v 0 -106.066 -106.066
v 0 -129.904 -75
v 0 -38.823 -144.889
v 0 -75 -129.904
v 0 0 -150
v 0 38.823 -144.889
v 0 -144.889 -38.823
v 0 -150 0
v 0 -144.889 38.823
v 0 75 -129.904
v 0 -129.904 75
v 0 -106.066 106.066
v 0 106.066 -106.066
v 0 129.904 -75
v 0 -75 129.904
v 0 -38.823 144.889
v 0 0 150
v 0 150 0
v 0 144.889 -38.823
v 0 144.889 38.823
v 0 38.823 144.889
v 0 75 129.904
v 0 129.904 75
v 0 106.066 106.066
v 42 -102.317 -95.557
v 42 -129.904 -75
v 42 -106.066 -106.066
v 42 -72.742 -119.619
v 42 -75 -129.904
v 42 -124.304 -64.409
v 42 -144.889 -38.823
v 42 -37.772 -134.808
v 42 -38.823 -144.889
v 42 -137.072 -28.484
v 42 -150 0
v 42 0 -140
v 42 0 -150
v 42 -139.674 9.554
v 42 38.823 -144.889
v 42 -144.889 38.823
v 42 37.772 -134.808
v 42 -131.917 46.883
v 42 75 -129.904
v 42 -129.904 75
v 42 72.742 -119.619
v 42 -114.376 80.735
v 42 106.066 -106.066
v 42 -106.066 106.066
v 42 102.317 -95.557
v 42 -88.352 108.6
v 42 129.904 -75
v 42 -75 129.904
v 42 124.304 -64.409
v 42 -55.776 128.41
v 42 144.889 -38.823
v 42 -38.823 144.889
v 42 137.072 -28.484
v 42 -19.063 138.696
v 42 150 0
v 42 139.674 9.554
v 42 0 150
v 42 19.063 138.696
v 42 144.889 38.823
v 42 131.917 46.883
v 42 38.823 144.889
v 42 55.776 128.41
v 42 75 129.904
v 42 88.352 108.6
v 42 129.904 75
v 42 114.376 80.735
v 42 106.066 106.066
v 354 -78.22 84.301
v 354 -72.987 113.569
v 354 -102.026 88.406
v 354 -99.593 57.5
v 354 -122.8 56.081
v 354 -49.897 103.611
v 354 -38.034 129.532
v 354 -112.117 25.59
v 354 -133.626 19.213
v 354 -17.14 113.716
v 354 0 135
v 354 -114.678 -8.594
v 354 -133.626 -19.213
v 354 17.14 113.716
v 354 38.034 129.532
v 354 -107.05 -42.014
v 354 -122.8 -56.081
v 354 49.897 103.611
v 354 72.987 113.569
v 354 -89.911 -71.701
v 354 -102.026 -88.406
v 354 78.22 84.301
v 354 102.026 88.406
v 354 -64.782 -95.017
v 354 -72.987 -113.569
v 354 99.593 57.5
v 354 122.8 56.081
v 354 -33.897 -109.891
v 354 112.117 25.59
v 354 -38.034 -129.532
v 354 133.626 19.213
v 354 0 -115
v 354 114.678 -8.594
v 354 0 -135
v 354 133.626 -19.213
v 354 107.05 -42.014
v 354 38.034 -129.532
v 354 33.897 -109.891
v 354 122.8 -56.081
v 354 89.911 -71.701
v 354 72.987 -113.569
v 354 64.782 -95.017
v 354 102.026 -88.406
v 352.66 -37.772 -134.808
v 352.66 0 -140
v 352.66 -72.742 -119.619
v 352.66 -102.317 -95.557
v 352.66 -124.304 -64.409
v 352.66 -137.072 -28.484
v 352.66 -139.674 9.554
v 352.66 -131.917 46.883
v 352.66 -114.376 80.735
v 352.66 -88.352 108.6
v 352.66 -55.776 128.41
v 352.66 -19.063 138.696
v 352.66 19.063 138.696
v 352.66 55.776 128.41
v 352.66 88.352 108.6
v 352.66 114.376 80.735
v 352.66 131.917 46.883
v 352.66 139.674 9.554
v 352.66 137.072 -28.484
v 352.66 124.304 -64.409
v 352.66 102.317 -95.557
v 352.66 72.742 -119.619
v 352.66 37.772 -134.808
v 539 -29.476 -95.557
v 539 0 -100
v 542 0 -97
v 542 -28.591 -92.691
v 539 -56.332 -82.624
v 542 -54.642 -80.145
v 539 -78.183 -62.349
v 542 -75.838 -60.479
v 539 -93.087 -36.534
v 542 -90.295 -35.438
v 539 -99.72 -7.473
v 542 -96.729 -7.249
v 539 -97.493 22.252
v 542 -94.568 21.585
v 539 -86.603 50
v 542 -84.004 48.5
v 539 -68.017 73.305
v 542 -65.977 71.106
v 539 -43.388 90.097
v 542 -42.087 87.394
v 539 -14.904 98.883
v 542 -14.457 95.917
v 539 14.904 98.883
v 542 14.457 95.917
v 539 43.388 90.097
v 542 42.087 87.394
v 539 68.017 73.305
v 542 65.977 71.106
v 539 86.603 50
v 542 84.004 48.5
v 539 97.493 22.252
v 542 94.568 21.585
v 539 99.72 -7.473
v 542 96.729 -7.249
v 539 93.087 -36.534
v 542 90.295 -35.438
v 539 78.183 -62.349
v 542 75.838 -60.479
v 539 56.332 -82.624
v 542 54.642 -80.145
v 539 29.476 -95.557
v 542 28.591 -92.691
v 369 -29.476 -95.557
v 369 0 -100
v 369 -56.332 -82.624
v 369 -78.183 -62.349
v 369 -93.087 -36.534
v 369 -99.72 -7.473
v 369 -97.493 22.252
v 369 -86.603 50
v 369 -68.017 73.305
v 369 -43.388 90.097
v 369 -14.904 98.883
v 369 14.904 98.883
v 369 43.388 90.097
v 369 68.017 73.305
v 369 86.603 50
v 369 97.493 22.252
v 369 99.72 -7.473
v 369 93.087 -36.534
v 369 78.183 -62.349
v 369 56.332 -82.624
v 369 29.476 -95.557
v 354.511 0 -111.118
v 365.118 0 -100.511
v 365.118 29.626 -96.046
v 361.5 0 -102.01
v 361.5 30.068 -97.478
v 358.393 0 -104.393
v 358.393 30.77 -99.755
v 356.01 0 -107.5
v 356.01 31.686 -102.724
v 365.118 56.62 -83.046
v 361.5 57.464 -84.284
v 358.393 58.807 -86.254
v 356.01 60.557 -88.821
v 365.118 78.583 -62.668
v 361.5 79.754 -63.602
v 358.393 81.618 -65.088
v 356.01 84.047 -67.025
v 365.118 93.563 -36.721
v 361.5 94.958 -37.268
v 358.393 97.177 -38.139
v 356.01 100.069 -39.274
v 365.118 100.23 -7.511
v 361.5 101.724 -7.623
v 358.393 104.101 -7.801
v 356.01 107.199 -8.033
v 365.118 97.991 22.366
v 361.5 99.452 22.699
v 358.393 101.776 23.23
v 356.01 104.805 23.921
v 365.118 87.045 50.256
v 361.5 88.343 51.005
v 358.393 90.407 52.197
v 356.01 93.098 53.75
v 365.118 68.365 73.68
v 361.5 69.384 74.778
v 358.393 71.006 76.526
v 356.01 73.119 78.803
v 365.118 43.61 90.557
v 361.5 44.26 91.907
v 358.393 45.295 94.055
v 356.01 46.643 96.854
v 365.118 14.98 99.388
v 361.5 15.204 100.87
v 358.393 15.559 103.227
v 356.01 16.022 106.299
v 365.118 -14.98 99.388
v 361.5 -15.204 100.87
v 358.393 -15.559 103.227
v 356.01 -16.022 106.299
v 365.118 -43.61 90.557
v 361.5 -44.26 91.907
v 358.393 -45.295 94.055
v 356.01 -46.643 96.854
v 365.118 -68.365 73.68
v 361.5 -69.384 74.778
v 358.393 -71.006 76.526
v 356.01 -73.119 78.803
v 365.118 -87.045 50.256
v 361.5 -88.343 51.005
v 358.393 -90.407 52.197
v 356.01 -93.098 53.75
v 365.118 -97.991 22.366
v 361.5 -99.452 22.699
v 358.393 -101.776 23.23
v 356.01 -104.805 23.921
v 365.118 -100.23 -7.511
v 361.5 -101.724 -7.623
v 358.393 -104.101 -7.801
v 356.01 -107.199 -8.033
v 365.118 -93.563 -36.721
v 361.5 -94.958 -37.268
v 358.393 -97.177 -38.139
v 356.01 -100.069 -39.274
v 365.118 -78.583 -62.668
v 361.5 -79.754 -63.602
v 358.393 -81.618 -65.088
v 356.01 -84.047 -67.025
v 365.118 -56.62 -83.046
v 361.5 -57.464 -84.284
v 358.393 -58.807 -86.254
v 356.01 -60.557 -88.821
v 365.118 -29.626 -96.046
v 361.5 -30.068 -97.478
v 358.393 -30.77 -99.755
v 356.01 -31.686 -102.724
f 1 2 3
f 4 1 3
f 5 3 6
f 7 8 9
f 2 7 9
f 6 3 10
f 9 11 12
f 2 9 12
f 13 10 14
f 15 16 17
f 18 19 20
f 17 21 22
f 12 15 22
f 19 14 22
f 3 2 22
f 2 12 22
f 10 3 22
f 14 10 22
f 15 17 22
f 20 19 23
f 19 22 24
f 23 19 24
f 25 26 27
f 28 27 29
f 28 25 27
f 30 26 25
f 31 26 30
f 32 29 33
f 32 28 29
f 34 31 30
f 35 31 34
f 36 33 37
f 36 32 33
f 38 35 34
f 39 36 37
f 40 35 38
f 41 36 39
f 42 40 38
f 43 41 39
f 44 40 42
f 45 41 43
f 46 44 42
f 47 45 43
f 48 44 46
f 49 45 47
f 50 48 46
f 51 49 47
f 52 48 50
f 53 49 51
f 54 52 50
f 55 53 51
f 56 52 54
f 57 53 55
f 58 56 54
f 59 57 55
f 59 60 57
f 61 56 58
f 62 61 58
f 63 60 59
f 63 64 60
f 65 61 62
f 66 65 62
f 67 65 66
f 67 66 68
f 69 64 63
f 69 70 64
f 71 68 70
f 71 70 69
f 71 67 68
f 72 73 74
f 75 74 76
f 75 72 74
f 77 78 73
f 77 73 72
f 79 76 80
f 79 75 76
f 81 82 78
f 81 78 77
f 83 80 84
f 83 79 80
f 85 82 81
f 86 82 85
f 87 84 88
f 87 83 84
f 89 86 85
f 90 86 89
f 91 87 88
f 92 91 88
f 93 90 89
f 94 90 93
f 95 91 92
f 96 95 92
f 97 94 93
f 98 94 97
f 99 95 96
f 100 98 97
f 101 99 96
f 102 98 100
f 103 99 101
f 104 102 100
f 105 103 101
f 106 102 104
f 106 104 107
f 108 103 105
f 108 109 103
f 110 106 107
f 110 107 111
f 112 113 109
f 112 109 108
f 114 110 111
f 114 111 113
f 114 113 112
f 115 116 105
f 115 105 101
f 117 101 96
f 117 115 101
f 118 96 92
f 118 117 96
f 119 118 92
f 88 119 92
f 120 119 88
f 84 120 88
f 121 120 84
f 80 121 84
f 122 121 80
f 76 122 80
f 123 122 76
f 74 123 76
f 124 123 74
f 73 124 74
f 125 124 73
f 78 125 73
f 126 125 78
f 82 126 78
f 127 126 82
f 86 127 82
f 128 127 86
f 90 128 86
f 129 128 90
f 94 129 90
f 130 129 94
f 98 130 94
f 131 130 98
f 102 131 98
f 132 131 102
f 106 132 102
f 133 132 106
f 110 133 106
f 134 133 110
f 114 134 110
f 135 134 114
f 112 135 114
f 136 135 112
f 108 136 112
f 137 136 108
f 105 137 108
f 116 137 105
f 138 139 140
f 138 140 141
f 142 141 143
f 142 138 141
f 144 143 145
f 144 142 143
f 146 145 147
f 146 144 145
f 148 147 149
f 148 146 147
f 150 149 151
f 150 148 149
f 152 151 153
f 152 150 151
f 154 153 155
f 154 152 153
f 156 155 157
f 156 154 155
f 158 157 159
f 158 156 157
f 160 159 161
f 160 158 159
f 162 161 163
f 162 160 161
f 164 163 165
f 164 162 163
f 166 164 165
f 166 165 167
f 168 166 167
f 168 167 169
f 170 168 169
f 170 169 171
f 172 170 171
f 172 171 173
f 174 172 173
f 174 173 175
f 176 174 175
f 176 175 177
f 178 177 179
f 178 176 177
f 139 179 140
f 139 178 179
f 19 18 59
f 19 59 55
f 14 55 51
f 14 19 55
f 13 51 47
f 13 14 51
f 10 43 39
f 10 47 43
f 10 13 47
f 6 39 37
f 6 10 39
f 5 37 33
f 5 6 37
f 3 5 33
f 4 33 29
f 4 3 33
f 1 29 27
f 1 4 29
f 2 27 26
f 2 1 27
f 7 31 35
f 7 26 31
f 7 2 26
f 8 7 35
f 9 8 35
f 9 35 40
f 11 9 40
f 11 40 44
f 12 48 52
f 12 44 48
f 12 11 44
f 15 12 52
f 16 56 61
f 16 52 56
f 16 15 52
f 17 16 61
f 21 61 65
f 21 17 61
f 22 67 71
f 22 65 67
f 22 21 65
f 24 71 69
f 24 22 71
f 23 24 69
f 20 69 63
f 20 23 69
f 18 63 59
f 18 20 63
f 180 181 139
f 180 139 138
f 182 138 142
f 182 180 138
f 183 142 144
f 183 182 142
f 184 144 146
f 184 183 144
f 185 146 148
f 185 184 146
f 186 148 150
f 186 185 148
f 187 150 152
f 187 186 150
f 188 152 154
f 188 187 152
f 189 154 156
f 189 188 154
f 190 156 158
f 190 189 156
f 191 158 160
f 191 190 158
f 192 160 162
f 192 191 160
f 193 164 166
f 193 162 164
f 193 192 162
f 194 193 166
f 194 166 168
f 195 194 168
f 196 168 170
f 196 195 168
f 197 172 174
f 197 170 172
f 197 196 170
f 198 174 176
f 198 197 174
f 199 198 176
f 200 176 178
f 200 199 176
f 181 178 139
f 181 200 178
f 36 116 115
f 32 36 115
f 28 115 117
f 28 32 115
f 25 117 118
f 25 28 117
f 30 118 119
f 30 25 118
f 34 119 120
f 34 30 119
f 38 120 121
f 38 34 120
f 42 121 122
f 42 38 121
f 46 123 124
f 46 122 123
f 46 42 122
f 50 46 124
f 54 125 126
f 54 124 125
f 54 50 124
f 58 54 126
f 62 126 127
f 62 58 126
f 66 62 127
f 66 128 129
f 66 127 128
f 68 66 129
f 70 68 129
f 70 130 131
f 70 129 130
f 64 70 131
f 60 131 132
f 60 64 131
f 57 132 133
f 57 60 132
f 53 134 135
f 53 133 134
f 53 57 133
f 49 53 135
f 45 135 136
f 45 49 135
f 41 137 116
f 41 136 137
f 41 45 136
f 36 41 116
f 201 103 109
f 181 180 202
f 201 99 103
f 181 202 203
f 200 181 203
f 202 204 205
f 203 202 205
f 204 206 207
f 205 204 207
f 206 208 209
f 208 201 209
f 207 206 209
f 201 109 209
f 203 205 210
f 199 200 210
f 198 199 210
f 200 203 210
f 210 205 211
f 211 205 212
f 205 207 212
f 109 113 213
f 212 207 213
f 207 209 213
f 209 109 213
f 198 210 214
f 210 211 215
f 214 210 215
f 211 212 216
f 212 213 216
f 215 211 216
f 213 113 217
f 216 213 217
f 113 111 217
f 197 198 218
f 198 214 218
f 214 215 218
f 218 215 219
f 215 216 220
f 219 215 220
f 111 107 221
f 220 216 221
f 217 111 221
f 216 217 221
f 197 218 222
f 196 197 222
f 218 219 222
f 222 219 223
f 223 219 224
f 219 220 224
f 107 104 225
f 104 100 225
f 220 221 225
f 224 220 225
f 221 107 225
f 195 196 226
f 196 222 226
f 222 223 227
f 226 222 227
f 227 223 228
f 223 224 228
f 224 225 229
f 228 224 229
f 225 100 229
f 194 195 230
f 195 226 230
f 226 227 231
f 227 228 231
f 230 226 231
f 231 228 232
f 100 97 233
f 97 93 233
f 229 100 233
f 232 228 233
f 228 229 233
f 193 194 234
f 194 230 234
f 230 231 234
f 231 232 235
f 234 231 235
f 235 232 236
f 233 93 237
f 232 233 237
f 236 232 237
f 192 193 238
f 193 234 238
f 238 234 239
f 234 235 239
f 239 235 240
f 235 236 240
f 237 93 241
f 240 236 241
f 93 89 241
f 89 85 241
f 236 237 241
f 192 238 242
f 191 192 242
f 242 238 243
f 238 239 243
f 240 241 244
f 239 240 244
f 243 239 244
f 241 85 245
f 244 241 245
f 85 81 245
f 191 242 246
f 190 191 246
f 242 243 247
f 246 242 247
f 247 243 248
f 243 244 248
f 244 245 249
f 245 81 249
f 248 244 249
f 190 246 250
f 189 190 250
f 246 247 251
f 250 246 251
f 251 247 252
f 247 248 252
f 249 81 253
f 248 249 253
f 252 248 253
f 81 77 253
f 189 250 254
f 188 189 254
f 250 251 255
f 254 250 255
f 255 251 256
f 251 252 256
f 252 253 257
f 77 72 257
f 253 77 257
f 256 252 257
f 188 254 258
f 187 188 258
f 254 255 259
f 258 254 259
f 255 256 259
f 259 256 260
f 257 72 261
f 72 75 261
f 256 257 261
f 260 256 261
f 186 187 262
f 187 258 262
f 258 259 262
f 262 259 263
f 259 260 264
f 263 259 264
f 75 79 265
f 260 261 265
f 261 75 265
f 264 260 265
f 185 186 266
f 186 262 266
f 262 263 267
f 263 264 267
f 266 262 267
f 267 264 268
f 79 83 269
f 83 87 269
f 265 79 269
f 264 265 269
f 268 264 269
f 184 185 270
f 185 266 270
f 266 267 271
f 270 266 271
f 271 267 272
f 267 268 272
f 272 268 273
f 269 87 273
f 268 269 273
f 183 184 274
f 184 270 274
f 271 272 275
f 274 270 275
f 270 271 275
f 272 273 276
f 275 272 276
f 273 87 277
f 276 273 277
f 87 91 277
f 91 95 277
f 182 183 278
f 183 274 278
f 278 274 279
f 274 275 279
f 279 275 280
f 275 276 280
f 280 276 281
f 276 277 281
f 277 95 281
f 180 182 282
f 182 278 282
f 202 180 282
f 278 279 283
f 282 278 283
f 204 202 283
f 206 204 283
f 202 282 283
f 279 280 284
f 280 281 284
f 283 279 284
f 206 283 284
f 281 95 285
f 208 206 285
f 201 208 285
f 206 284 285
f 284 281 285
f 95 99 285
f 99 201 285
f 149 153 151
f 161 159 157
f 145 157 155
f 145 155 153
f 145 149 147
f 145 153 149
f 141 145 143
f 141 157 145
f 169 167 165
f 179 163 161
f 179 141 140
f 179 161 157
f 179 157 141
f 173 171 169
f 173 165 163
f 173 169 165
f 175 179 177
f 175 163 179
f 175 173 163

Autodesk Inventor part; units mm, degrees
ref_plane "YZ Plane" through (0, 0, 0) normal (1, 0, 0) x (0, 1, 0)
ref_plane "XZ Plane" through (0, 0, 0) normal (0, 1, 0) x (-1, 0, 0)
ref_plane "XY Plane" through (0, 0, 0) normal (0, 0, 1) x (1, 0, 0)
sketch "Sketch1" plane through (0, 0, 0) normal (1, 0, 0) x (0, 1, 0)
  circle A0 centre (0, 0) radius 150
  dimension "d0" = 300
extrude "Extrusion1" add sketch "Sketch1" along normal blind 42
sketch "Sketch2" plane through (42, 0, 0) normal (1, 0, 0) x (0, 0, -1)
  circle A0 centre (0, 0) radius 140
  dimension "d3" = 280
extrude "Extrusion2" add sketch "Sketch2" along normal blind 312
sketch "Sketch3" plane through (354, 0, 0) normal (1, 0, 0) x (0, 0, -1)
  circle A0 centre (0, 0) radius 100
  dimension "d6" = 200
extrude "Extrusion3" add sketch "Sketch3" along normal blind 188
chamfer "Chamfer1" distance 5 angle 15 1 edges at (354, 0, 140) measured on face at (354, 2.3252, 126.4215)
chamfer "Chamfer2" distance 3 angle 45 1 edges at (542, 0, 100) measured on face at (542, 30.5098, 9.4965)
fillet "Fillet1" radius 15 1 edges at (354, 0, 100)
properties part number "eje"
